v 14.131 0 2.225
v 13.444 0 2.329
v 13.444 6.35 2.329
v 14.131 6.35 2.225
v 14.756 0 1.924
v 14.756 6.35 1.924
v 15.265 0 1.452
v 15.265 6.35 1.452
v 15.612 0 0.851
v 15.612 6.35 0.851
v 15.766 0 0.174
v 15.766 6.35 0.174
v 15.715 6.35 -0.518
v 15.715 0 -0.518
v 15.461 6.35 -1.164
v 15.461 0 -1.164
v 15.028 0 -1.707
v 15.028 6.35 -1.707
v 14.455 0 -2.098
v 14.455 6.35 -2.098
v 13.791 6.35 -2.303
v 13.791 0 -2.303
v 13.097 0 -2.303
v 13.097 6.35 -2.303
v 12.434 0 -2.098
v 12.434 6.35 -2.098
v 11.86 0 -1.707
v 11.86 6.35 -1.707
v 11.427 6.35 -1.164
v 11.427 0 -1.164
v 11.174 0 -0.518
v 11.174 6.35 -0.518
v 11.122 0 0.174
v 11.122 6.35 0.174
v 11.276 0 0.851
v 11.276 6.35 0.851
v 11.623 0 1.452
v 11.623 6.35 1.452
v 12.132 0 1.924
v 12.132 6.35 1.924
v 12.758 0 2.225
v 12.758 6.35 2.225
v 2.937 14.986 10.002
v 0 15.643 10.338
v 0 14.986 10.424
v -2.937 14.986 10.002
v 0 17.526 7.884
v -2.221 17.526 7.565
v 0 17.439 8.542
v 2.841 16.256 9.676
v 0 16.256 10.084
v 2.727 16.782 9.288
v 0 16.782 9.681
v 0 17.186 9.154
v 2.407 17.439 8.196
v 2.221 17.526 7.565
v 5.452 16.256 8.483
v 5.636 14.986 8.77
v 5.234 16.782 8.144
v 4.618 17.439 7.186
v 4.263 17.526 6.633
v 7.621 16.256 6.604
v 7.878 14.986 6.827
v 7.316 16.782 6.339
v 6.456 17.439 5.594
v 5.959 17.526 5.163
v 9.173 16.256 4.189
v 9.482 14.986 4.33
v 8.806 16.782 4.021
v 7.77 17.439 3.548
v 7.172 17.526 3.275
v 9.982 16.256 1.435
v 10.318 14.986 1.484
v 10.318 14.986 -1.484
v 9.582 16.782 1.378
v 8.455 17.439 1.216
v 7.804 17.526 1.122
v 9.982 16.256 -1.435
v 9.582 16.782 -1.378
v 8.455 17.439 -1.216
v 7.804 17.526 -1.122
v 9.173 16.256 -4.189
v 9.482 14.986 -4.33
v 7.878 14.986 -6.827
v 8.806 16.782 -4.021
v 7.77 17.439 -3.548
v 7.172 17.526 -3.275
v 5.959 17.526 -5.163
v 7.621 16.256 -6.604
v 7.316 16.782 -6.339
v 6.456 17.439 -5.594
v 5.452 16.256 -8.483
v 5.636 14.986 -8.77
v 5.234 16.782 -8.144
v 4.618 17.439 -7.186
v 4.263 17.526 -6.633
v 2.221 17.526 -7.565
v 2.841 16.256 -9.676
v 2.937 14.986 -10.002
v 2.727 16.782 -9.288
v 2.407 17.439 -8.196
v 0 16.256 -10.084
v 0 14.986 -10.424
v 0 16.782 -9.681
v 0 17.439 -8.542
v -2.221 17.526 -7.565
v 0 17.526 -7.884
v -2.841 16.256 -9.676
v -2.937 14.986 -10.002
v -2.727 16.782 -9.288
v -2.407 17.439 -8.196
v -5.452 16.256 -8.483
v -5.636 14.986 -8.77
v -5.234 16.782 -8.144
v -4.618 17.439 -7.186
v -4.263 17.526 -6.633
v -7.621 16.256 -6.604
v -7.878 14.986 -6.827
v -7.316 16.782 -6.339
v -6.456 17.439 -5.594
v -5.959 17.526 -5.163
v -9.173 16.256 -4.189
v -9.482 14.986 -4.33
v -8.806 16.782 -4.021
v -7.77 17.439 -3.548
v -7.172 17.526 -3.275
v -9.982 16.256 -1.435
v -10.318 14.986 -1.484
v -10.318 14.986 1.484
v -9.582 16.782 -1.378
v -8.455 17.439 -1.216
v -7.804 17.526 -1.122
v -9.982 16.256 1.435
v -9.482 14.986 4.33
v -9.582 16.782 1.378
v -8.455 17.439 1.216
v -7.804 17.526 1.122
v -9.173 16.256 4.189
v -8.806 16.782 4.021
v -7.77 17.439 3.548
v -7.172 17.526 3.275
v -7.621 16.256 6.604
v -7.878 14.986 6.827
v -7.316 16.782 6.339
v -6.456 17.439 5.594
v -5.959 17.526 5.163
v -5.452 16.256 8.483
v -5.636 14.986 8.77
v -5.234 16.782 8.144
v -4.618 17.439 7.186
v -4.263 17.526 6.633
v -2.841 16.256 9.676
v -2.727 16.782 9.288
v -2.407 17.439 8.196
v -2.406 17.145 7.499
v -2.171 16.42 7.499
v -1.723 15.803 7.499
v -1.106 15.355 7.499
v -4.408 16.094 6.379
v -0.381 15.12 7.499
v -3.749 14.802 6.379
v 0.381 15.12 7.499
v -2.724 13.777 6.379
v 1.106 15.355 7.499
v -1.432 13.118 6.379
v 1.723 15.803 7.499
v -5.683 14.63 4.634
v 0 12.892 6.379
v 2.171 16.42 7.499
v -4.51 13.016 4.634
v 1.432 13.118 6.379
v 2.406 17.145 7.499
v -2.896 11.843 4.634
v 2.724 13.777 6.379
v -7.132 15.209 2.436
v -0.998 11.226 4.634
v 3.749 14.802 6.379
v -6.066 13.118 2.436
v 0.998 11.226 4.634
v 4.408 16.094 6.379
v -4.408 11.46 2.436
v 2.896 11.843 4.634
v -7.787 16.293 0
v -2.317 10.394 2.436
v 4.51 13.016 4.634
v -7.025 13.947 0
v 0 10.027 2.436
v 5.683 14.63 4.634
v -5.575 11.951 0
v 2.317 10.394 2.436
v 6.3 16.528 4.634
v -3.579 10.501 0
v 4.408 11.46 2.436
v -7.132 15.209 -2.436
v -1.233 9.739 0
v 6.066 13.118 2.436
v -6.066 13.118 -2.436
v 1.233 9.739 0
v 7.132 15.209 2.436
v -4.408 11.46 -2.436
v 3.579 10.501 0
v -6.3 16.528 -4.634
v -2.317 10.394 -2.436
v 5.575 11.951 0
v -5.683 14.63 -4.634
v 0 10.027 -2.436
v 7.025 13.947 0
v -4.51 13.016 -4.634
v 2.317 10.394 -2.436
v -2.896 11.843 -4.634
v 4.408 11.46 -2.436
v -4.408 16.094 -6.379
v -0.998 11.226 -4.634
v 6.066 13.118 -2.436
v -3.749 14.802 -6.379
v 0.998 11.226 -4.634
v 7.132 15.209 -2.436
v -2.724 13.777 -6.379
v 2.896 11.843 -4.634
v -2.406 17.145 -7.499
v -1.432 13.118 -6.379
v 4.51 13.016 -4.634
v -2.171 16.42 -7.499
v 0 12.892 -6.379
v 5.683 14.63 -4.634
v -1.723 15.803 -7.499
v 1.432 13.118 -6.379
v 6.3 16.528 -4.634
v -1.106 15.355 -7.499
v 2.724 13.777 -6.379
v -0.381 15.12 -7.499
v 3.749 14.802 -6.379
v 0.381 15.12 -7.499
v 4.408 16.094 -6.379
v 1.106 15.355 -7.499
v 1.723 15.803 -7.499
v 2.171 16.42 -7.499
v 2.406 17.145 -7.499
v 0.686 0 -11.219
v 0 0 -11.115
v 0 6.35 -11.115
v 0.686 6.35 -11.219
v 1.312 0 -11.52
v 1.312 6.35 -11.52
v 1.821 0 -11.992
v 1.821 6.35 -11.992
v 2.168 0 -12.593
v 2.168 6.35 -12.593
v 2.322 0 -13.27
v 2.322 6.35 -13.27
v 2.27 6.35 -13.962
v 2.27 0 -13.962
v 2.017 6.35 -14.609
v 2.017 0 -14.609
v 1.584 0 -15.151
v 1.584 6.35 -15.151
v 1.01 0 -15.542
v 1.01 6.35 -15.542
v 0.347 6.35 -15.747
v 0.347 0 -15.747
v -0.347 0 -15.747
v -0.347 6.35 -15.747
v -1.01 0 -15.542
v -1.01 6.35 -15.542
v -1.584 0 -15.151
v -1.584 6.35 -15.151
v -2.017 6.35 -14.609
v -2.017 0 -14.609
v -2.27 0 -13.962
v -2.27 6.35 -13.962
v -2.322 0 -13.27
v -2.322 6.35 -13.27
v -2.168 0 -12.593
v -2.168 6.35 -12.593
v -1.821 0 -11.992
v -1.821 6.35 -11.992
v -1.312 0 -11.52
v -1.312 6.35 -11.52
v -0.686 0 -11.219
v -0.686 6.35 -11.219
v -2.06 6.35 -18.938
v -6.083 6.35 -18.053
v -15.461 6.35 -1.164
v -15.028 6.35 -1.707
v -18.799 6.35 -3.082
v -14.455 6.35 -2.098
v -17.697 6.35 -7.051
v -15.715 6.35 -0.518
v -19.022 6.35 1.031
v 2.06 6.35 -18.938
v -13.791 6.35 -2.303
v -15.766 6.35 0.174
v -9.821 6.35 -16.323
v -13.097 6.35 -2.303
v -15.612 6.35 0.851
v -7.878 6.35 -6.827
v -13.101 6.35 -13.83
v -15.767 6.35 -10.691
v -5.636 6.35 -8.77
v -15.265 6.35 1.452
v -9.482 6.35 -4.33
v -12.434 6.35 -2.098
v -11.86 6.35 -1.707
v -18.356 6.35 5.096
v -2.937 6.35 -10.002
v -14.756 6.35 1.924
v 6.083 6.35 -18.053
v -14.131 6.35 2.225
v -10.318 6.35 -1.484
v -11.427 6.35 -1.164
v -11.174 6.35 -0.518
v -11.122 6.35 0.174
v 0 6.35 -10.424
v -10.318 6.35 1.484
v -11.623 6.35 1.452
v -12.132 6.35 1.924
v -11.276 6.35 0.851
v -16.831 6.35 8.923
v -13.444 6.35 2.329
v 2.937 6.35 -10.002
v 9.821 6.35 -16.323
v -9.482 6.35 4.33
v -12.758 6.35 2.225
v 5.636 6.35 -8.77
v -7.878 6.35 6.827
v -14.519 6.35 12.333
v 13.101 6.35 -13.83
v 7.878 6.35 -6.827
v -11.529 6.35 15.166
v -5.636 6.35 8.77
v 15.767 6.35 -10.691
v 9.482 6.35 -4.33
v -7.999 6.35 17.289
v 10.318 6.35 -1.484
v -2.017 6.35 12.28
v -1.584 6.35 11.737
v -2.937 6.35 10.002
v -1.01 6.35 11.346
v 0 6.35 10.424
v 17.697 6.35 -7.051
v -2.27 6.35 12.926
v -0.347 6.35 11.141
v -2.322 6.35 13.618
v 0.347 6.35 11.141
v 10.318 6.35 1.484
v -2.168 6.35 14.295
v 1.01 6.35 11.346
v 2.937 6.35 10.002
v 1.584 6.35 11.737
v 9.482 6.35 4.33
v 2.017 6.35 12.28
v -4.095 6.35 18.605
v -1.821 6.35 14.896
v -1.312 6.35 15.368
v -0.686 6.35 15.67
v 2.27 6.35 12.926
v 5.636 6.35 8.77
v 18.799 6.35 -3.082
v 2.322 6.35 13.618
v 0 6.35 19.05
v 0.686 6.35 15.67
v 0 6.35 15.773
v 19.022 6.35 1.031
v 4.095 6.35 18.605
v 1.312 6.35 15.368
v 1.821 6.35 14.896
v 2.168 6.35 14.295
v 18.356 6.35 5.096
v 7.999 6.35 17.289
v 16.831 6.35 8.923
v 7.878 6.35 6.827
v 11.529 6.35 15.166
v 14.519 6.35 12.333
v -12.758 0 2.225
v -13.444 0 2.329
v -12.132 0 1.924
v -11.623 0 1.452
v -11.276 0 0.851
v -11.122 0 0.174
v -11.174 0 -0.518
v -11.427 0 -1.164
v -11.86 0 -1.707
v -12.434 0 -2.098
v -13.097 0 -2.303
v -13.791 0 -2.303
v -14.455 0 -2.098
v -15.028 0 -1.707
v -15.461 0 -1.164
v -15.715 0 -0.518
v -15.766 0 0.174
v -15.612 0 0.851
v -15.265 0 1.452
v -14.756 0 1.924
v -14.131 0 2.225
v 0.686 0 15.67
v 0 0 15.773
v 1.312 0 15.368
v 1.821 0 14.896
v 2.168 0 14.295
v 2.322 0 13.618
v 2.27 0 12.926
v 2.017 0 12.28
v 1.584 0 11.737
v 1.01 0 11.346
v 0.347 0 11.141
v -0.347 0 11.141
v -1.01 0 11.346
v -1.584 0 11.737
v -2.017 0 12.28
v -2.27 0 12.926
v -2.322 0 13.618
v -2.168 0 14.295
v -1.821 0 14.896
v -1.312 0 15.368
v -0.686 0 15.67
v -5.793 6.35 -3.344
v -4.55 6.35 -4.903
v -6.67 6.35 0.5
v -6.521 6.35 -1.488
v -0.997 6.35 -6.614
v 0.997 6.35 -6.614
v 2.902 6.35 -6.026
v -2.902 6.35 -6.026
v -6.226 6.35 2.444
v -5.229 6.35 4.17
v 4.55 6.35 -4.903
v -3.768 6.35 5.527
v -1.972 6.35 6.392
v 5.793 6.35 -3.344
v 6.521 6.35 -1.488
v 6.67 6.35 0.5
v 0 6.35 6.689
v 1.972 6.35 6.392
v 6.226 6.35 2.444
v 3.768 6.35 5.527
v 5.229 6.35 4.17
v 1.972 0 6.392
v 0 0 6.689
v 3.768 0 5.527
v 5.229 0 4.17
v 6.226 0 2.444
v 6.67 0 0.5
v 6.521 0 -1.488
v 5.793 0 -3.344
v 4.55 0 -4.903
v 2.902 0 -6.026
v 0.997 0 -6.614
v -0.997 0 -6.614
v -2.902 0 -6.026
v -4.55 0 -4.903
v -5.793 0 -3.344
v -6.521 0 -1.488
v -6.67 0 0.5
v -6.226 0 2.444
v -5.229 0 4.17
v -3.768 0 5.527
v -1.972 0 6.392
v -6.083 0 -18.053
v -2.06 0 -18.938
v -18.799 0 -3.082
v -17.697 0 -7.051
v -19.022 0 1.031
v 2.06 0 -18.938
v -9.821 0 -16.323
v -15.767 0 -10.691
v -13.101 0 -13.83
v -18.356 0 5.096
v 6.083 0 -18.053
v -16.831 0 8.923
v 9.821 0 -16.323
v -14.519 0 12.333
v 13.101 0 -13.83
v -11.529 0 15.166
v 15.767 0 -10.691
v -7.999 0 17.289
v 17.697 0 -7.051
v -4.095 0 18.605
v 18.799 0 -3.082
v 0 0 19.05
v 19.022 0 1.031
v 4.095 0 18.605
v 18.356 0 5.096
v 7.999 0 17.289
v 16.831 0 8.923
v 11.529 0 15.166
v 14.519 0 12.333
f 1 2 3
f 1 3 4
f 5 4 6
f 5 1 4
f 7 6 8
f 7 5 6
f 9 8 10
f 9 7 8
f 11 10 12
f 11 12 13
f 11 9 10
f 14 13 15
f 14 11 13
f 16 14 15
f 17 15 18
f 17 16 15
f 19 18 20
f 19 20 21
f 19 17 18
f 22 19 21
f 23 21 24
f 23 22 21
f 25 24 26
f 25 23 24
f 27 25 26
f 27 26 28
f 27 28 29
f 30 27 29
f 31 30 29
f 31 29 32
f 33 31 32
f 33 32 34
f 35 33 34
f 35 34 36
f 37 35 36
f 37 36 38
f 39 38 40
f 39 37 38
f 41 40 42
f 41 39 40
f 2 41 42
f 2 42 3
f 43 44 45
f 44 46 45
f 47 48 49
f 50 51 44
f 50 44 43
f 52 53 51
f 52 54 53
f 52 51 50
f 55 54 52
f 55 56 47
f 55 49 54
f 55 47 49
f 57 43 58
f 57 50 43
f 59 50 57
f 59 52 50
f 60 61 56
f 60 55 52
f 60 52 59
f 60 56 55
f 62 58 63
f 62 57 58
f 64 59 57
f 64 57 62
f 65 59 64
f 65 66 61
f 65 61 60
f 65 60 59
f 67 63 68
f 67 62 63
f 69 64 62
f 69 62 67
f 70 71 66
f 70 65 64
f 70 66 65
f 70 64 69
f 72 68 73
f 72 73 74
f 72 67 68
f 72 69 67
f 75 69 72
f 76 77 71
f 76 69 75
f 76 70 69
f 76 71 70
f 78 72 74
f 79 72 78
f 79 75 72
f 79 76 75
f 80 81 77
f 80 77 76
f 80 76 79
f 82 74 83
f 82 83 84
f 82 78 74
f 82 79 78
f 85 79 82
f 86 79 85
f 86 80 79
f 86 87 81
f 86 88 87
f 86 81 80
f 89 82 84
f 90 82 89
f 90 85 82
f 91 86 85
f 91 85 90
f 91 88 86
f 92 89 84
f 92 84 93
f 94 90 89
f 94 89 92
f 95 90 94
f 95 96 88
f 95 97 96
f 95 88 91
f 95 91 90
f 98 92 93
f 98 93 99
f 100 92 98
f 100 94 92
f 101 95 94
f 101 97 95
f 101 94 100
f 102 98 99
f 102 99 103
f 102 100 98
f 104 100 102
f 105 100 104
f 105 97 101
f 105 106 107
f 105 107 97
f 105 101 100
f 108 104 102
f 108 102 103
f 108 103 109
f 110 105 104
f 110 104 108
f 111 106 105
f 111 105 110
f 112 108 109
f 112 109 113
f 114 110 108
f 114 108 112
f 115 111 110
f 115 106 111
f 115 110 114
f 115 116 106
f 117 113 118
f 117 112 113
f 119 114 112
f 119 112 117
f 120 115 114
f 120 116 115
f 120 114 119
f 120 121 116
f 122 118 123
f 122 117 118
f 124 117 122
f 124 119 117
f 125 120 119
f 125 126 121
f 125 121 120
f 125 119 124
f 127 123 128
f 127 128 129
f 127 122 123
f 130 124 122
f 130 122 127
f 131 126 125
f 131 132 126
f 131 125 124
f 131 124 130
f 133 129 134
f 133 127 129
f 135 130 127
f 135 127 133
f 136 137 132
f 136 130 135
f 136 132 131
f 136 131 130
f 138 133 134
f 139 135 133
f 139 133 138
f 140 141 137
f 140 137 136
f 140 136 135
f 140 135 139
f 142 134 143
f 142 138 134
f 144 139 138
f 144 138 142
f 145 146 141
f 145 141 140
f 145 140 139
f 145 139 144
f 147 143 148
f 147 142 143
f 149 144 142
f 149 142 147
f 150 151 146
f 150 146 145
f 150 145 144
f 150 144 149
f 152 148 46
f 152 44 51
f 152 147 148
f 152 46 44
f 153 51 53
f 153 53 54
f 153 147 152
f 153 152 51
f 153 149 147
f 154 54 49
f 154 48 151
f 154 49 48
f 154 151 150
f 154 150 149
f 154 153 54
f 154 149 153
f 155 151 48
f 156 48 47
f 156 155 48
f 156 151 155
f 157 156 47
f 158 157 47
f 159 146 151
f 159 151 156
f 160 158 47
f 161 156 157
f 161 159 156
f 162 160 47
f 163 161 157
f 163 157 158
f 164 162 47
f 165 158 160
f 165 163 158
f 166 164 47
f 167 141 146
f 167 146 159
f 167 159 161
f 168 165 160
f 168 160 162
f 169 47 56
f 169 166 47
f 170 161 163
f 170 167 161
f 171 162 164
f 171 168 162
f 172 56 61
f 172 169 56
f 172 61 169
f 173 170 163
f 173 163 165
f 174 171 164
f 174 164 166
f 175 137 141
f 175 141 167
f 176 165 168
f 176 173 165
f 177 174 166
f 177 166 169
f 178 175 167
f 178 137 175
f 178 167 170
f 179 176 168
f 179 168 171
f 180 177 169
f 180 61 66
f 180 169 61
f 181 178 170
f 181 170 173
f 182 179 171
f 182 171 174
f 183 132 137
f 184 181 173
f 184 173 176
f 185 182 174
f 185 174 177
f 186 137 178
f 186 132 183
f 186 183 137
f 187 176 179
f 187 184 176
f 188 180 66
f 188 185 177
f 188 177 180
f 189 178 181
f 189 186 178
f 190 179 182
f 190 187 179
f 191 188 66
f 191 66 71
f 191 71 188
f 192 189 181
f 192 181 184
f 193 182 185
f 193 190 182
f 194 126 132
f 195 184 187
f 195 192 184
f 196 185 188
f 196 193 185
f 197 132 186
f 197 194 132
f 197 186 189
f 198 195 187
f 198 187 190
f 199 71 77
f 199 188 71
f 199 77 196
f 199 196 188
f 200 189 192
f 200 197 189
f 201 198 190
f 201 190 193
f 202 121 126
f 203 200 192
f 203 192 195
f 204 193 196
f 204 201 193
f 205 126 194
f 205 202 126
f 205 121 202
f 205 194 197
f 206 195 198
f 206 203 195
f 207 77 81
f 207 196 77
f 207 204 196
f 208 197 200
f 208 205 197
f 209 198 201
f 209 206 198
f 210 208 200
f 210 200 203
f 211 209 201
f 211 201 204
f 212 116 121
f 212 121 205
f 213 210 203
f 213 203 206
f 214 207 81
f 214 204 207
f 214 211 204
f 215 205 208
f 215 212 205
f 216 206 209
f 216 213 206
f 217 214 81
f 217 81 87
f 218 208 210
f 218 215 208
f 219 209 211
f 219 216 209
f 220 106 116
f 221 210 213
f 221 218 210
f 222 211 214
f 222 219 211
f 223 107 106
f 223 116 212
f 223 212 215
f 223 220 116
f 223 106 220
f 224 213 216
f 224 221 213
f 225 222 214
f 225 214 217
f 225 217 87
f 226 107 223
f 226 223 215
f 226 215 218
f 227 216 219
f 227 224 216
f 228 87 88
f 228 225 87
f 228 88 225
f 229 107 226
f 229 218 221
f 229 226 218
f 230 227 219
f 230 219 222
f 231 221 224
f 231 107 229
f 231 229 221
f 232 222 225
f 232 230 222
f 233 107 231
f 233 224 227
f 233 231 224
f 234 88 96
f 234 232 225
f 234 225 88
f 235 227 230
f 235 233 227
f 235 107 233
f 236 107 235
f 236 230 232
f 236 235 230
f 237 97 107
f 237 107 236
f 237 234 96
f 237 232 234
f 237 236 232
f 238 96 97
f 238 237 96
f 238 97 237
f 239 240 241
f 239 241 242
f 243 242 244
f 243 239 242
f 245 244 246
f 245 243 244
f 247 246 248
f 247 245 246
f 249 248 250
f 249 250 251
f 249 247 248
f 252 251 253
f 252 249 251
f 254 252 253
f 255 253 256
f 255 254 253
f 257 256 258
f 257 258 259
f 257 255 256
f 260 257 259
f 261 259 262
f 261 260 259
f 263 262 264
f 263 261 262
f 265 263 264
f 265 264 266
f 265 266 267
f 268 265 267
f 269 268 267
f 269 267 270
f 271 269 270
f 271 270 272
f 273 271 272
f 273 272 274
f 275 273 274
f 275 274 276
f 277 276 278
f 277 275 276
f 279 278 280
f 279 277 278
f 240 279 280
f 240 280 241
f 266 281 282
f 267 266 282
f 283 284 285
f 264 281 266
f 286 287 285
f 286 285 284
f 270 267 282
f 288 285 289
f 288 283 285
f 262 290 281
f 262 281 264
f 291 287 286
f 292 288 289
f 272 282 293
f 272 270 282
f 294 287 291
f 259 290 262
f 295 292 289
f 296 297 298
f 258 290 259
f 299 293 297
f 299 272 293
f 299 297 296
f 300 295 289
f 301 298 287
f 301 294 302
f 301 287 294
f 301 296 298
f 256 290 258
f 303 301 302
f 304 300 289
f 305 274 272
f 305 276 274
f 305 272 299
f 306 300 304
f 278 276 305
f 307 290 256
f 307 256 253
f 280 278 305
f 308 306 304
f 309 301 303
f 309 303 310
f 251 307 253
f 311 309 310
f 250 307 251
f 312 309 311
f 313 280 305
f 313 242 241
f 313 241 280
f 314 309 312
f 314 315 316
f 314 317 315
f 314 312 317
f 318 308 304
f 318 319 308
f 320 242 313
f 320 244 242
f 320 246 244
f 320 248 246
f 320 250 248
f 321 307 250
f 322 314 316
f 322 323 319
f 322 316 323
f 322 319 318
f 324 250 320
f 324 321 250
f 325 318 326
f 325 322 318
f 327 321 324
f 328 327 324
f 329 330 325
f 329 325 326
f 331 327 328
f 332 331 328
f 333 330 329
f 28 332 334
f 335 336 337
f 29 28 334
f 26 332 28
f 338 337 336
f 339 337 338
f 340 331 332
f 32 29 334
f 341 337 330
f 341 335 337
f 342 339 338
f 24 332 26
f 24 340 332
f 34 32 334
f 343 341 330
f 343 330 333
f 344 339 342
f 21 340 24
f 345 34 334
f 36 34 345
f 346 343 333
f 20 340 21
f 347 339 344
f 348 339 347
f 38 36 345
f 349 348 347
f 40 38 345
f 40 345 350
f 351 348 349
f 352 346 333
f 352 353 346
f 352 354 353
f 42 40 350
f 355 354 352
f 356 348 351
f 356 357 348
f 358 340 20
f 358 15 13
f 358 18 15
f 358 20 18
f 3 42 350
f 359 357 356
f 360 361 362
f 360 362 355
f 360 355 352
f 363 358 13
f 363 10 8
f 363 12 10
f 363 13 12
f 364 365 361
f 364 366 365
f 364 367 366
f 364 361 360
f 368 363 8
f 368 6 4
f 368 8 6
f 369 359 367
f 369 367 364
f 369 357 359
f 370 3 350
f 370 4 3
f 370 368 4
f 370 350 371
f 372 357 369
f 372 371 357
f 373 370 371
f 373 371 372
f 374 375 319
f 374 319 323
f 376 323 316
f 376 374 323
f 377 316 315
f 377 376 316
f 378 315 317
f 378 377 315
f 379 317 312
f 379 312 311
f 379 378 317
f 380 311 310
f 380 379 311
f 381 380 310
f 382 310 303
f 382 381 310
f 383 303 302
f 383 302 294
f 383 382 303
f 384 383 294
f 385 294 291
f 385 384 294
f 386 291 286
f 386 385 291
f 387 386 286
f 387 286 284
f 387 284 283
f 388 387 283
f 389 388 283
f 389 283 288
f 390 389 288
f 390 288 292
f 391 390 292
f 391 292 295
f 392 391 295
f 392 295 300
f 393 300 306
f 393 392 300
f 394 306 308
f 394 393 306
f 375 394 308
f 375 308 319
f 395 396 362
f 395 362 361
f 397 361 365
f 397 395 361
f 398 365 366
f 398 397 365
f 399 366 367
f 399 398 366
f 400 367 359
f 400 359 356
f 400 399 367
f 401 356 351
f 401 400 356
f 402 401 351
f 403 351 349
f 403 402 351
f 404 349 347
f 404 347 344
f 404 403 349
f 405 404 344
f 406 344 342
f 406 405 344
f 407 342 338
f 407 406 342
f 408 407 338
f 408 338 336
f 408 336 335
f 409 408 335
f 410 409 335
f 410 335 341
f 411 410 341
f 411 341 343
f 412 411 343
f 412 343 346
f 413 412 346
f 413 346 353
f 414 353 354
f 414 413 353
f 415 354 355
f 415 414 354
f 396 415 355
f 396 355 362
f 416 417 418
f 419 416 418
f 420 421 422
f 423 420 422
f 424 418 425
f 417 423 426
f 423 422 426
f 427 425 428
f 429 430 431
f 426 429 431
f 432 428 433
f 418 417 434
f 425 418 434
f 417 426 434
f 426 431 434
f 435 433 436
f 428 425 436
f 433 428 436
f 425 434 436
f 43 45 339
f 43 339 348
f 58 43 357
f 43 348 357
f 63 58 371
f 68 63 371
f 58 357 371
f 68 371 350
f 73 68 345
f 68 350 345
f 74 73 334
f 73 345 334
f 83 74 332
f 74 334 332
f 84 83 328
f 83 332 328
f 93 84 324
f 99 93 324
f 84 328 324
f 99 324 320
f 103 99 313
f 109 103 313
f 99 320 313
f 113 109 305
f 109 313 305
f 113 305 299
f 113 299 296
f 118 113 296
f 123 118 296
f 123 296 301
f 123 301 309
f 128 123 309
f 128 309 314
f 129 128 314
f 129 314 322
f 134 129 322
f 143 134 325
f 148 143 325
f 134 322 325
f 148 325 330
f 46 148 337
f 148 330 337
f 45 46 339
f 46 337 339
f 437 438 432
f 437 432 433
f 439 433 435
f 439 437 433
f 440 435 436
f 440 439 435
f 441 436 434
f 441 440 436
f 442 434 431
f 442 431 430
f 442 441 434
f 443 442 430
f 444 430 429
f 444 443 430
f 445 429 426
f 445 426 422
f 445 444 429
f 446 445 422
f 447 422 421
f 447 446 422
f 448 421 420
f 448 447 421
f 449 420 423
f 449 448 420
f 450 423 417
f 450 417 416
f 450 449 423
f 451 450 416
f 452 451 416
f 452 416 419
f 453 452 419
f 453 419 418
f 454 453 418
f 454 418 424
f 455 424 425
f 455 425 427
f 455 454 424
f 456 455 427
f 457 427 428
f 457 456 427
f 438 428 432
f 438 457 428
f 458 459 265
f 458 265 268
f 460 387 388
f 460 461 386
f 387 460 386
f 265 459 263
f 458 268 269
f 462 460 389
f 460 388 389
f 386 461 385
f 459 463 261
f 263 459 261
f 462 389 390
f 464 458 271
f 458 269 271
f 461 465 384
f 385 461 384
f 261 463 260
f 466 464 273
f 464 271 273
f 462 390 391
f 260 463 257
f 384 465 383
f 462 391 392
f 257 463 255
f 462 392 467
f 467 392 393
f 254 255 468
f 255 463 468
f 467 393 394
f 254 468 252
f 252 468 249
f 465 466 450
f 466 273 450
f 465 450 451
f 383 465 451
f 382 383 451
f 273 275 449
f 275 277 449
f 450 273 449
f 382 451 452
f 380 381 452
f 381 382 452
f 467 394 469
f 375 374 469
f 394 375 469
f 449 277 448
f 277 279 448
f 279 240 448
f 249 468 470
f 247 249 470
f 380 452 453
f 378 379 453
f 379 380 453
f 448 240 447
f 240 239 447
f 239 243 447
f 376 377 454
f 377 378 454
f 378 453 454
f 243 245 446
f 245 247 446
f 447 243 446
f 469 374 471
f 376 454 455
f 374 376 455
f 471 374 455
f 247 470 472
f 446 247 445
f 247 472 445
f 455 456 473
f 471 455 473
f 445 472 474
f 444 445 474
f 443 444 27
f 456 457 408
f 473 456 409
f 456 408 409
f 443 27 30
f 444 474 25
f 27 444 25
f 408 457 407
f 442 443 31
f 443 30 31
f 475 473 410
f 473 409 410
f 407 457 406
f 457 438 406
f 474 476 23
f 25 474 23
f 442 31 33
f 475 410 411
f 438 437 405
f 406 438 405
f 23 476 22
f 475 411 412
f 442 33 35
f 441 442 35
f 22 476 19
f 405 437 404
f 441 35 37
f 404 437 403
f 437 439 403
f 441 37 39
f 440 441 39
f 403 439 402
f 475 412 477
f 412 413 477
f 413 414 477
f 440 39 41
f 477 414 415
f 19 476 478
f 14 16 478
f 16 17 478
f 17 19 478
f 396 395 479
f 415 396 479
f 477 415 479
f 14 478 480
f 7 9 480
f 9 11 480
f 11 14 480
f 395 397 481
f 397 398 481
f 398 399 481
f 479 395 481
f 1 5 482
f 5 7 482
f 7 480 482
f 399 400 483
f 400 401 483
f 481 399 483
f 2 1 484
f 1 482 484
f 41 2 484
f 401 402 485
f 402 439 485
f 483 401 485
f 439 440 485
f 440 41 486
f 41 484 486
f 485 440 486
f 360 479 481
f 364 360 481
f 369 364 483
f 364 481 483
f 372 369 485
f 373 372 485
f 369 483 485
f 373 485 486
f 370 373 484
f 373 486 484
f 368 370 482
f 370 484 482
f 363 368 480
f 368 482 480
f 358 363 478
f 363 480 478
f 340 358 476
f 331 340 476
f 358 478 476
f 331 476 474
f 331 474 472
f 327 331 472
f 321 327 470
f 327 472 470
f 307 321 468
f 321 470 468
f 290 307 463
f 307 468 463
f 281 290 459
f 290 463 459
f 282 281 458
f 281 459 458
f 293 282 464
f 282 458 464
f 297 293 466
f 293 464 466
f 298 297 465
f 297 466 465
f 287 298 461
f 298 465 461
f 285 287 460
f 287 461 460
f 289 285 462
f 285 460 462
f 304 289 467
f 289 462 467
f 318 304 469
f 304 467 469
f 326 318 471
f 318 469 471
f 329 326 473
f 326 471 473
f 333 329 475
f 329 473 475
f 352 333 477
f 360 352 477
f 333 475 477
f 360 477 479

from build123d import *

# Parameters (mm, degrees)
SKETCH2_R           = 19.05
SKETCH2_R_2         = 6.688770164
SKETCH2_R_3         = 2.328803663
BOSS_EXTRUDE1_DEPTH = 6.35
SKETCH3_R           = 10.424468921
BOSS_EXTRUDE2_DEPTH = 11.176
FILLET1_R           = 2.54


with BuildPart() as part:
    # Sketch2 → Boss-Extrude1 (new body)
    with BuildSketch(Plane(origin=(0, 0, 0), x_dir=(1, 0, 0), z_dir=(0, 1, 0))):
        with Locations(Location((0, 0, 0), (0, 0, 270))):
            Circle(SKETCH2_R)
        with Locations(Location((0, 0, 0), (0, 0, 270))):
            Circle(SKETCH2_R_2, mode=Mode.SUBTRACT)
        with Locations(Location((0, 13.4441798, 0), (0, 0, 270))):
            Circle(SKETCH2_R_3, mode=Mode.SUBTRACT)
        with Locations(Location((13.4441798, 0, 0), (0, 0, 270))):
            Circle(SKETCH2_R_3, mode=Mode.SUBTRACT)
        with Locations(Location((0, -13.4441798, 0), (0, 0, 270))):
            Circle(SKETCH2_R_3, mode=Mode.SUBTRACT)
        with Locations(Location((-13.4441798, 0, 0), (0, 0, 270))):
            Circle(SKETCH2_R_3, mode=Mode.SUBTRACT)
    extrude(amount=BOSS_EXTRUDE1_DEPTH)

    # Sketch3 → Boss-Extrude2 (add)
    with BuildSketch(Plane(origin=(0, 6.35, 0), x_dir=(1, 0, 0), z_dir=(0, 1, 0))):
        with Locations(Location((0, 0, 0), (0, 0, 270))):
            Circle(SKETCH3_R)
    extrude(amount=BOSS_EXTRUDE2_DEPTH)

    # Fillet1
    fillet1_edges = [part.edges().sort_by_distance(p)[0] for p in [
        (0, 17.526, -10.424468921),
    ]]
    fillet(fillet1_edges, radius=FILLET1_R)


with BuildPart() as body_2:
    # Sketch5 → Revolve1 (revolve)
    with BuildSketch(Plane(origin=(0, 17.526, 0), x_dir=(1, 0, 0), z_dir=(0, 1, 0))):
        with BuildLine():
            Line((0, 7.884468921), (0, -7.884468921))
            ThreePointArc((0, -7.884468921), (7.884468921, 0), (0, 7.884468921))
        make_face()
    revolve(axis=Axis((0, 17.526, -14.295685005), (0, 0, 1)))


with BuildPart() as part_1:
    add(part.part)

    # Combine1: cut body 2
    add(body_2.part, mode=Mode.SUBTRACT)


solid = part_1.part
